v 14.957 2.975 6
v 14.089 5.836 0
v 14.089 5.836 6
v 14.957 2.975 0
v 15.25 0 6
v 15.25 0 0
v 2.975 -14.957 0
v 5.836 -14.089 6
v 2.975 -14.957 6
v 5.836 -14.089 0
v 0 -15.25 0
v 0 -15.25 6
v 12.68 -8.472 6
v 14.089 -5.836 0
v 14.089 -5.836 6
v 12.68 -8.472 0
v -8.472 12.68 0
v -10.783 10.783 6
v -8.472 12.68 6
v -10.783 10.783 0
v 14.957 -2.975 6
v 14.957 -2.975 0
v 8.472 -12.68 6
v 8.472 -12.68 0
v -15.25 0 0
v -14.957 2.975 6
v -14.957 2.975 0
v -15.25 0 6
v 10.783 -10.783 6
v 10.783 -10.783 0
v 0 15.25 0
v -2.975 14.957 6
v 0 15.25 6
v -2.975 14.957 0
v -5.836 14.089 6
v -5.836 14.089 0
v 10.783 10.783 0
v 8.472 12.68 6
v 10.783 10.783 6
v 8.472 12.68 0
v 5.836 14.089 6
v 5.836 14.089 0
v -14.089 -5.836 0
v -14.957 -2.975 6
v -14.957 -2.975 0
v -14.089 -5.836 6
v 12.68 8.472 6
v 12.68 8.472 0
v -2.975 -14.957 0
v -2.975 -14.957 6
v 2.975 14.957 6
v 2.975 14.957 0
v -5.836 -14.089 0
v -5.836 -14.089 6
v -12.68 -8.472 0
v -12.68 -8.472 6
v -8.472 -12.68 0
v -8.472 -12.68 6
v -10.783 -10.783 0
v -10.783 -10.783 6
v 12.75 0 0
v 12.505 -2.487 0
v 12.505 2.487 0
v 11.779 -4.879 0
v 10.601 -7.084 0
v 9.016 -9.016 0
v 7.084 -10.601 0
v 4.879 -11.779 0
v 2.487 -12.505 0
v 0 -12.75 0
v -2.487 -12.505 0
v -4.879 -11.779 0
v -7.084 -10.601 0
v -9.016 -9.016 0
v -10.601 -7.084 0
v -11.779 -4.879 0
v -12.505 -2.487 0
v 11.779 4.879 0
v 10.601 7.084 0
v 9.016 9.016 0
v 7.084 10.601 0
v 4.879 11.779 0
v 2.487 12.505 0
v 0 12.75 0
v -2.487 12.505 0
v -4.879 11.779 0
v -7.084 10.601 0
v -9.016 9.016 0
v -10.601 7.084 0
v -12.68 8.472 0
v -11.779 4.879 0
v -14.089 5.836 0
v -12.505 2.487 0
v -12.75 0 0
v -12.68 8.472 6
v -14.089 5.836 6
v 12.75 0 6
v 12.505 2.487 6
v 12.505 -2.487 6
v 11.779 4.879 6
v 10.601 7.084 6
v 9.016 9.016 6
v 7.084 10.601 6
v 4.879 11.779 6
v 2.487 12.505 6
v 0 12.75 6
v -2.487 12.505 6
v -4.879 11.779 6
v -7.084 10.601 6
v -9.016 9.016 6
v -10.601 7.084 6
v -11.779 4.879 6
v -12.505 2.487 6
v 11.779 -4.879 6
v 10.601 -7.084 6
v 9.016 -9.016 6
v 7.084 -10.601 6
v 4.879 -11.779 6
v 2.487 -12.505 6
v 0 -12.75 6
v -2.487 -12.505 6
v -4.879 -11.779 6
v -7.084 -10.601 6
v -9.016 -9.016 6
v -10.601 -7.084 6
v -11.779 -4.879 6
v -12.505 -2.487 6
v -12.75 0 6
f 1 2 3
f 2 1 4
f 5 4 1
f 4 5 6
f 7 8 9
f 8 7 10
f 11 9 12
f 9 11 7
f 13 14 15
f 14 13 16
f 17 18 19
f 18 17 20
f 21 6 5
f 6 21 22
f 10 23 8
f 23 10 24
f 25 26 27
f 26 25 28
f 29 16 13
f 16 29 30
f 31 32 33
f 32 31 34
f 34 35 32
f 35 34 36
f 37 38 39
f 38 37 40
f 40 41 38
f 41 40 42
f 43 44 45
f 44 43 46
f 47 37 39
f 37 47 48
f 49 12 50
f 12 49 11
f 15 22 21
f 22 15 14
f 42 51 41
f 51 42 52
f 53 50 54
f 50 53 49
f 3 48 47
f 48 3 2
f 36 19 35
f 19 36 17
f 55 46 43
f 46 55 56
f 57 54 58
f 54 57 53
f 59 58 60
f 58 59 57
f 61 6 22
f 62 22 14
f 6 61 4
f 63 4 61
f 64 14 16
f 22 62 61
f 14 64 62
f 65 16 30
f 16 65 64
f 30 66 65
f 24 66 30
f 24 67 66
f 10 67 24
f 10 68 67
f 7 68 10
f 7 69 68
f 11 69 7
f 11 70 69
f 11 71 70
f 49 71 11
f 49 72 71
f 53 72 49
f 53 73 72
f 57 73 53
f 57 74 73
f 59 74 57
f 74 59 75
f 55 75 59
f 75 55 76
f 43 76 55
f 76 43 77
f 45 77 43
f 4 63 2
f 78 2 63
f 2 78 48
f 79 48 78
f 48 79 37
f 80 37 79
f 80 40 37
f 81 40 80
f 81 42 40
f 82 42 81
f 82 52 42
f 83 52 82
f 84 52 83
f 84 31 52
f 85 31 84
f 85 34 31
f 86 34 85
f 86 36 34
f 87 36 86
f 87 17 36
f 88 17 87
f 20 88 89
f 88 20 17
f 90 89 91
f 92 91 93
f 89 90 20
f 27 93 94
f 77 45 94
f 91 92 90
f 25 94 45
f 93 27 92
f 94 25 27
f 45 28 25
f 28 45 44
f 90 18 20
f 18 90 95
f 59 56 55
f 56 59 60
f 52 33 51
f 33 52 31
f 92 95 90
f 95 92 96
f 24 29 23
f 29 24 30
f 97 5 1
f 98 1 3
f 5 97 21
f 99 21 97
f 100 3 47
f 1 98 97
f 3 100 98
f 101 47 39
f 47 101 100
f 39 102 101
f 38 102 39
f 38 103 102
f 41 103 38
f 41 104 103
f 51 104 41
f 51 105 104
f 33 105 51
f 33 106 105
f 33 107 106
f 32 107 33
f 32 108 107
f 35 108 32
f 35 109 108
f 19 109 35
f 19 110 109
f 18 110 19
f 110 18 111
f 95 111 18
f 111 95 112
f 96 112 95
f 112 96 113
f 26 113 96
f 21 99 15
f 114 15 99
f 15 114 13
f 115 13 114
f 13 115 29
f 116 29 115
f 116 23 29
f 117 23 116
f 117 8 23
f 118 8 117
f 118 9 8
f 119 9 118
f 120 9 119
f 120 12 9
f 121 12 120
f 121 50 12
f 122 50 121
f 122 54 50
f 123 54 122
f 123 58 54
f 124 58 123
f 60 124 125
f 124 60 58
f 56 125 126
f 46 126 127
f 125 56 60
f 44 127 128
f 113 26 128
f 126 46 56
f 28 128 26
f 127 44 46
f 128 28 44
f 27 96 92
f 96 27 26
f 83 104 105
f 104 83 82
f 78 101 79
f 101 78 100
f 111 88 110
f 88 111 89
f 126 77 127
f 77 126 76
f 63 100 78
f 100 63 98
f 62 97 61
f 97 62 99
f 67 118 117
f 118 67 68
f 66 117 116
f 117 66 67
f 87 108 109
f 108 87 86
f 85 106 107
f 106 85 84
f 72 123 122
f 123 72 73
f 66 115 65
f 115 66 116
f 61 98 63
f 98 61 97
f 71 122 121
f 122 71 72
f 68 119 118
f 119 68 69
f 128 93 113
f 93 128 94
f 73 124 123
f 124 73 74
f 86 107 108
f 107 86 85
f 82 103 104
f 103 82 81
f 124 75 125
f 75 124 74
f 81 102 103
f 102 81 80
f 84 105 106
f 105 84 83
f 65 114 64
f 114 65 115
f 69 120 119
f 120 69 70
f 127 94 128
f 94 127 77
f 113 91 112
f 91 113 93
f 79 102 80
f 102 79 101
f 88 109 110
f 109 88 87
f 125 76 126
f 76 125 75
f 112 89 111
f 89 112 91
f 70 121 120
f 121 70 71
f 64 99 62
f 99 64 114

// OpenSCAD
$fn = 32;

// ----------------------------------------------------------------------
// Spacer sleeve: 30.5 / 25.5 x 6 mm
// ----------------------------------------------------------------------

// --- parameters (mm) ---
sleeve_od = 30.5;         // outside diameter
sleeve_id = 25.5;         // shaft bore
sleeve_l = 6;             // sleeve length

module sleeve() {
  cylinder(h = sleeve_l, d = sleeve_od);
}

difference() {
  sleeve();
  translate([0, 0, -1]) cylinder(h = sleeve_l + 2, d = sleeve_id);
}
